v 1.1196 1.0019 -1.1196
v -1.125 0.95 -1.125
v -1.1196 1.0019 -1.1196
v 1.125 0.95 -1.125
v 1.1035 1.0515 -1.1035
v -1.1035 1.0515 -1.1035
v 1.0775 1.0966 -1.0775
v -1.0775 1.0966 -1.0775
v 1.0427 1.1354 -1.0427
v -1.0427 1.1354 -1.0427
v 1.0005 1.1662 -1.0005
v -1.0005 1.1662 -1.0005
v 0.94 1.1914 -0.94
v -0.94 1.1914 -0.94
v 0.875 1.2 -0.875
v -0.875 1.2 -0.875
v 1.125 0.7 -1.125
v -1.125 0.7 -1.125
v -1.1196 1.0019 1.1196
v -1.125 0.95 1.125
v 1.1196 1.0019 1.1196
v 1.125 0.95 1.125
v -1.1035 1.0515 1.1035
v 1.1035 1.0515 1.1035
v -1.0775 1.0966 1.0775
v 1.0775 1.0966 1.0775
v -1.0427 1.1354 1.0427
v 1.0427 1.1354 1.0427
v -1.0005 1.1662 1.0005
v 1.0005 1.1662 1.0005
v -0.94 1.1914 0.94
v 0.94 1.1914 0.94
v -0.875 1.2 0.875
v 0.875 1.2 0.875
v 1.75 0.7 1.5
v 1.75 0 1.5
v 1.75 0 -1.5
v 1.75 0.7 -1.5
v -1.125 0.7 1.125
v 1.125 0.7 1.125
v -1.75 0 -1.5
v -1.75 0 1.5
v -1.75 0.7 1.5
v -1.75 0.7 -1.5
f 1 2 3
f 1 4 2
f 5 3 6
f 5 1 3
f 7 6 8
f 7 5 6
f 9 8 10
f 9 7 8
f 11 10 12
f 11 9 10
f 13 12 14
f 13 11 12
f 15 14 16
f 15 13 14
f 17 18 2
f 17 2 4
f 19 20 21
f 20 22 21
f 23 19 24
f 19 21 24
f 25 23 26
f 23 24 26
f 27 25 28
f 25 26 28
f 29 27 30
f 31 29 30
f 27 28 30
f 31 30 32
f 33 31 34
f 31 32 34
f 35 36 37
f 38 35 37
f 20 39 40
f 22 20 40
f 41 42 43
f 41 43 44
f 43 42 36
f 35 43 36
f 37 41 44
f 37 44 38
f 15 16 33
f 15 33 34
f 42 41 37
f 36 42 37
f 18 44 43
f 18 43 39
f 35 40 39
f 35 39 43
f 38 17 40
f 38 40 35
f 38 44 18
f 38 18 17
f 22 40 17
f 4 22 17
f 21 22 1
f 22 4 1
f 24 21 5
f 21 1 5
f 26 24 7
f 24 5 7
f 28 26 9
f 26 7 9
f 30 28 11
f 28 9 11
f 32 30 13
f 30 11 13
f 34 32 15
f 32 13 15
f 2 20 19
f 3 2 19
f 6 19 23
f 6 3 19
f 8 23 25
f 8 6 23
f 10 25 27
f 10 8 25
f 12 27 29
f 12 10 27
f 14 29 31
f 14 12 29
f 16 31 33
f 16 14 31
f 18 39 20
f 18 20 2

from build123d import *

# Parameters (mm, degrees)
SKETCH1_W           = 3.5
SKETCH1_H           = 3
BOSS_EXTRUDE1_DEPTH = 0.7
SKETCH2_W           = 2.25
SKETCH2_H           = 2.25
BOSS_EXTRUDE2_DEPTH = 0.5
FILLET1_R           = 0.25


with BuildPart() as part:
    # Sketch1 → Boss-Extrude1 (new body)
    with BuildSketch(Plane(origin=(0, 0, 0), x_dir=(1, 0, 0), z_dir=(0, 1, 0))):
        Rectangle(SKETCH1_W, SKETCH1_H)
    extrude(amount=BOSS_EXTRUDE1_DEPTH)

    # Sketch2 → Boss-Extrude2 (add)
    with BuildSketch(Plane(origin=(0, 0.7, 0), x_dir=(1, 0, 0), z_dir=(0, 1, 0))):
        Rectangle(SKETCH2_W, SKETCH2_H)
    extrude(amount=BOSS_EXTRUDE2_DEPTH)

    # Fillet1
    fillet1_edges = [part.edges().sort_by_distance(p)[0] for p in [
        (0, 1.2, -1.125),
        (1.125, 1.2, 0),
        (-1.125, 1.2, 0),
        (0, 1.2, 1.125),
    ]]
    fillet(fillet1_edges, radius=FILLET1_R)


solid = part.part
